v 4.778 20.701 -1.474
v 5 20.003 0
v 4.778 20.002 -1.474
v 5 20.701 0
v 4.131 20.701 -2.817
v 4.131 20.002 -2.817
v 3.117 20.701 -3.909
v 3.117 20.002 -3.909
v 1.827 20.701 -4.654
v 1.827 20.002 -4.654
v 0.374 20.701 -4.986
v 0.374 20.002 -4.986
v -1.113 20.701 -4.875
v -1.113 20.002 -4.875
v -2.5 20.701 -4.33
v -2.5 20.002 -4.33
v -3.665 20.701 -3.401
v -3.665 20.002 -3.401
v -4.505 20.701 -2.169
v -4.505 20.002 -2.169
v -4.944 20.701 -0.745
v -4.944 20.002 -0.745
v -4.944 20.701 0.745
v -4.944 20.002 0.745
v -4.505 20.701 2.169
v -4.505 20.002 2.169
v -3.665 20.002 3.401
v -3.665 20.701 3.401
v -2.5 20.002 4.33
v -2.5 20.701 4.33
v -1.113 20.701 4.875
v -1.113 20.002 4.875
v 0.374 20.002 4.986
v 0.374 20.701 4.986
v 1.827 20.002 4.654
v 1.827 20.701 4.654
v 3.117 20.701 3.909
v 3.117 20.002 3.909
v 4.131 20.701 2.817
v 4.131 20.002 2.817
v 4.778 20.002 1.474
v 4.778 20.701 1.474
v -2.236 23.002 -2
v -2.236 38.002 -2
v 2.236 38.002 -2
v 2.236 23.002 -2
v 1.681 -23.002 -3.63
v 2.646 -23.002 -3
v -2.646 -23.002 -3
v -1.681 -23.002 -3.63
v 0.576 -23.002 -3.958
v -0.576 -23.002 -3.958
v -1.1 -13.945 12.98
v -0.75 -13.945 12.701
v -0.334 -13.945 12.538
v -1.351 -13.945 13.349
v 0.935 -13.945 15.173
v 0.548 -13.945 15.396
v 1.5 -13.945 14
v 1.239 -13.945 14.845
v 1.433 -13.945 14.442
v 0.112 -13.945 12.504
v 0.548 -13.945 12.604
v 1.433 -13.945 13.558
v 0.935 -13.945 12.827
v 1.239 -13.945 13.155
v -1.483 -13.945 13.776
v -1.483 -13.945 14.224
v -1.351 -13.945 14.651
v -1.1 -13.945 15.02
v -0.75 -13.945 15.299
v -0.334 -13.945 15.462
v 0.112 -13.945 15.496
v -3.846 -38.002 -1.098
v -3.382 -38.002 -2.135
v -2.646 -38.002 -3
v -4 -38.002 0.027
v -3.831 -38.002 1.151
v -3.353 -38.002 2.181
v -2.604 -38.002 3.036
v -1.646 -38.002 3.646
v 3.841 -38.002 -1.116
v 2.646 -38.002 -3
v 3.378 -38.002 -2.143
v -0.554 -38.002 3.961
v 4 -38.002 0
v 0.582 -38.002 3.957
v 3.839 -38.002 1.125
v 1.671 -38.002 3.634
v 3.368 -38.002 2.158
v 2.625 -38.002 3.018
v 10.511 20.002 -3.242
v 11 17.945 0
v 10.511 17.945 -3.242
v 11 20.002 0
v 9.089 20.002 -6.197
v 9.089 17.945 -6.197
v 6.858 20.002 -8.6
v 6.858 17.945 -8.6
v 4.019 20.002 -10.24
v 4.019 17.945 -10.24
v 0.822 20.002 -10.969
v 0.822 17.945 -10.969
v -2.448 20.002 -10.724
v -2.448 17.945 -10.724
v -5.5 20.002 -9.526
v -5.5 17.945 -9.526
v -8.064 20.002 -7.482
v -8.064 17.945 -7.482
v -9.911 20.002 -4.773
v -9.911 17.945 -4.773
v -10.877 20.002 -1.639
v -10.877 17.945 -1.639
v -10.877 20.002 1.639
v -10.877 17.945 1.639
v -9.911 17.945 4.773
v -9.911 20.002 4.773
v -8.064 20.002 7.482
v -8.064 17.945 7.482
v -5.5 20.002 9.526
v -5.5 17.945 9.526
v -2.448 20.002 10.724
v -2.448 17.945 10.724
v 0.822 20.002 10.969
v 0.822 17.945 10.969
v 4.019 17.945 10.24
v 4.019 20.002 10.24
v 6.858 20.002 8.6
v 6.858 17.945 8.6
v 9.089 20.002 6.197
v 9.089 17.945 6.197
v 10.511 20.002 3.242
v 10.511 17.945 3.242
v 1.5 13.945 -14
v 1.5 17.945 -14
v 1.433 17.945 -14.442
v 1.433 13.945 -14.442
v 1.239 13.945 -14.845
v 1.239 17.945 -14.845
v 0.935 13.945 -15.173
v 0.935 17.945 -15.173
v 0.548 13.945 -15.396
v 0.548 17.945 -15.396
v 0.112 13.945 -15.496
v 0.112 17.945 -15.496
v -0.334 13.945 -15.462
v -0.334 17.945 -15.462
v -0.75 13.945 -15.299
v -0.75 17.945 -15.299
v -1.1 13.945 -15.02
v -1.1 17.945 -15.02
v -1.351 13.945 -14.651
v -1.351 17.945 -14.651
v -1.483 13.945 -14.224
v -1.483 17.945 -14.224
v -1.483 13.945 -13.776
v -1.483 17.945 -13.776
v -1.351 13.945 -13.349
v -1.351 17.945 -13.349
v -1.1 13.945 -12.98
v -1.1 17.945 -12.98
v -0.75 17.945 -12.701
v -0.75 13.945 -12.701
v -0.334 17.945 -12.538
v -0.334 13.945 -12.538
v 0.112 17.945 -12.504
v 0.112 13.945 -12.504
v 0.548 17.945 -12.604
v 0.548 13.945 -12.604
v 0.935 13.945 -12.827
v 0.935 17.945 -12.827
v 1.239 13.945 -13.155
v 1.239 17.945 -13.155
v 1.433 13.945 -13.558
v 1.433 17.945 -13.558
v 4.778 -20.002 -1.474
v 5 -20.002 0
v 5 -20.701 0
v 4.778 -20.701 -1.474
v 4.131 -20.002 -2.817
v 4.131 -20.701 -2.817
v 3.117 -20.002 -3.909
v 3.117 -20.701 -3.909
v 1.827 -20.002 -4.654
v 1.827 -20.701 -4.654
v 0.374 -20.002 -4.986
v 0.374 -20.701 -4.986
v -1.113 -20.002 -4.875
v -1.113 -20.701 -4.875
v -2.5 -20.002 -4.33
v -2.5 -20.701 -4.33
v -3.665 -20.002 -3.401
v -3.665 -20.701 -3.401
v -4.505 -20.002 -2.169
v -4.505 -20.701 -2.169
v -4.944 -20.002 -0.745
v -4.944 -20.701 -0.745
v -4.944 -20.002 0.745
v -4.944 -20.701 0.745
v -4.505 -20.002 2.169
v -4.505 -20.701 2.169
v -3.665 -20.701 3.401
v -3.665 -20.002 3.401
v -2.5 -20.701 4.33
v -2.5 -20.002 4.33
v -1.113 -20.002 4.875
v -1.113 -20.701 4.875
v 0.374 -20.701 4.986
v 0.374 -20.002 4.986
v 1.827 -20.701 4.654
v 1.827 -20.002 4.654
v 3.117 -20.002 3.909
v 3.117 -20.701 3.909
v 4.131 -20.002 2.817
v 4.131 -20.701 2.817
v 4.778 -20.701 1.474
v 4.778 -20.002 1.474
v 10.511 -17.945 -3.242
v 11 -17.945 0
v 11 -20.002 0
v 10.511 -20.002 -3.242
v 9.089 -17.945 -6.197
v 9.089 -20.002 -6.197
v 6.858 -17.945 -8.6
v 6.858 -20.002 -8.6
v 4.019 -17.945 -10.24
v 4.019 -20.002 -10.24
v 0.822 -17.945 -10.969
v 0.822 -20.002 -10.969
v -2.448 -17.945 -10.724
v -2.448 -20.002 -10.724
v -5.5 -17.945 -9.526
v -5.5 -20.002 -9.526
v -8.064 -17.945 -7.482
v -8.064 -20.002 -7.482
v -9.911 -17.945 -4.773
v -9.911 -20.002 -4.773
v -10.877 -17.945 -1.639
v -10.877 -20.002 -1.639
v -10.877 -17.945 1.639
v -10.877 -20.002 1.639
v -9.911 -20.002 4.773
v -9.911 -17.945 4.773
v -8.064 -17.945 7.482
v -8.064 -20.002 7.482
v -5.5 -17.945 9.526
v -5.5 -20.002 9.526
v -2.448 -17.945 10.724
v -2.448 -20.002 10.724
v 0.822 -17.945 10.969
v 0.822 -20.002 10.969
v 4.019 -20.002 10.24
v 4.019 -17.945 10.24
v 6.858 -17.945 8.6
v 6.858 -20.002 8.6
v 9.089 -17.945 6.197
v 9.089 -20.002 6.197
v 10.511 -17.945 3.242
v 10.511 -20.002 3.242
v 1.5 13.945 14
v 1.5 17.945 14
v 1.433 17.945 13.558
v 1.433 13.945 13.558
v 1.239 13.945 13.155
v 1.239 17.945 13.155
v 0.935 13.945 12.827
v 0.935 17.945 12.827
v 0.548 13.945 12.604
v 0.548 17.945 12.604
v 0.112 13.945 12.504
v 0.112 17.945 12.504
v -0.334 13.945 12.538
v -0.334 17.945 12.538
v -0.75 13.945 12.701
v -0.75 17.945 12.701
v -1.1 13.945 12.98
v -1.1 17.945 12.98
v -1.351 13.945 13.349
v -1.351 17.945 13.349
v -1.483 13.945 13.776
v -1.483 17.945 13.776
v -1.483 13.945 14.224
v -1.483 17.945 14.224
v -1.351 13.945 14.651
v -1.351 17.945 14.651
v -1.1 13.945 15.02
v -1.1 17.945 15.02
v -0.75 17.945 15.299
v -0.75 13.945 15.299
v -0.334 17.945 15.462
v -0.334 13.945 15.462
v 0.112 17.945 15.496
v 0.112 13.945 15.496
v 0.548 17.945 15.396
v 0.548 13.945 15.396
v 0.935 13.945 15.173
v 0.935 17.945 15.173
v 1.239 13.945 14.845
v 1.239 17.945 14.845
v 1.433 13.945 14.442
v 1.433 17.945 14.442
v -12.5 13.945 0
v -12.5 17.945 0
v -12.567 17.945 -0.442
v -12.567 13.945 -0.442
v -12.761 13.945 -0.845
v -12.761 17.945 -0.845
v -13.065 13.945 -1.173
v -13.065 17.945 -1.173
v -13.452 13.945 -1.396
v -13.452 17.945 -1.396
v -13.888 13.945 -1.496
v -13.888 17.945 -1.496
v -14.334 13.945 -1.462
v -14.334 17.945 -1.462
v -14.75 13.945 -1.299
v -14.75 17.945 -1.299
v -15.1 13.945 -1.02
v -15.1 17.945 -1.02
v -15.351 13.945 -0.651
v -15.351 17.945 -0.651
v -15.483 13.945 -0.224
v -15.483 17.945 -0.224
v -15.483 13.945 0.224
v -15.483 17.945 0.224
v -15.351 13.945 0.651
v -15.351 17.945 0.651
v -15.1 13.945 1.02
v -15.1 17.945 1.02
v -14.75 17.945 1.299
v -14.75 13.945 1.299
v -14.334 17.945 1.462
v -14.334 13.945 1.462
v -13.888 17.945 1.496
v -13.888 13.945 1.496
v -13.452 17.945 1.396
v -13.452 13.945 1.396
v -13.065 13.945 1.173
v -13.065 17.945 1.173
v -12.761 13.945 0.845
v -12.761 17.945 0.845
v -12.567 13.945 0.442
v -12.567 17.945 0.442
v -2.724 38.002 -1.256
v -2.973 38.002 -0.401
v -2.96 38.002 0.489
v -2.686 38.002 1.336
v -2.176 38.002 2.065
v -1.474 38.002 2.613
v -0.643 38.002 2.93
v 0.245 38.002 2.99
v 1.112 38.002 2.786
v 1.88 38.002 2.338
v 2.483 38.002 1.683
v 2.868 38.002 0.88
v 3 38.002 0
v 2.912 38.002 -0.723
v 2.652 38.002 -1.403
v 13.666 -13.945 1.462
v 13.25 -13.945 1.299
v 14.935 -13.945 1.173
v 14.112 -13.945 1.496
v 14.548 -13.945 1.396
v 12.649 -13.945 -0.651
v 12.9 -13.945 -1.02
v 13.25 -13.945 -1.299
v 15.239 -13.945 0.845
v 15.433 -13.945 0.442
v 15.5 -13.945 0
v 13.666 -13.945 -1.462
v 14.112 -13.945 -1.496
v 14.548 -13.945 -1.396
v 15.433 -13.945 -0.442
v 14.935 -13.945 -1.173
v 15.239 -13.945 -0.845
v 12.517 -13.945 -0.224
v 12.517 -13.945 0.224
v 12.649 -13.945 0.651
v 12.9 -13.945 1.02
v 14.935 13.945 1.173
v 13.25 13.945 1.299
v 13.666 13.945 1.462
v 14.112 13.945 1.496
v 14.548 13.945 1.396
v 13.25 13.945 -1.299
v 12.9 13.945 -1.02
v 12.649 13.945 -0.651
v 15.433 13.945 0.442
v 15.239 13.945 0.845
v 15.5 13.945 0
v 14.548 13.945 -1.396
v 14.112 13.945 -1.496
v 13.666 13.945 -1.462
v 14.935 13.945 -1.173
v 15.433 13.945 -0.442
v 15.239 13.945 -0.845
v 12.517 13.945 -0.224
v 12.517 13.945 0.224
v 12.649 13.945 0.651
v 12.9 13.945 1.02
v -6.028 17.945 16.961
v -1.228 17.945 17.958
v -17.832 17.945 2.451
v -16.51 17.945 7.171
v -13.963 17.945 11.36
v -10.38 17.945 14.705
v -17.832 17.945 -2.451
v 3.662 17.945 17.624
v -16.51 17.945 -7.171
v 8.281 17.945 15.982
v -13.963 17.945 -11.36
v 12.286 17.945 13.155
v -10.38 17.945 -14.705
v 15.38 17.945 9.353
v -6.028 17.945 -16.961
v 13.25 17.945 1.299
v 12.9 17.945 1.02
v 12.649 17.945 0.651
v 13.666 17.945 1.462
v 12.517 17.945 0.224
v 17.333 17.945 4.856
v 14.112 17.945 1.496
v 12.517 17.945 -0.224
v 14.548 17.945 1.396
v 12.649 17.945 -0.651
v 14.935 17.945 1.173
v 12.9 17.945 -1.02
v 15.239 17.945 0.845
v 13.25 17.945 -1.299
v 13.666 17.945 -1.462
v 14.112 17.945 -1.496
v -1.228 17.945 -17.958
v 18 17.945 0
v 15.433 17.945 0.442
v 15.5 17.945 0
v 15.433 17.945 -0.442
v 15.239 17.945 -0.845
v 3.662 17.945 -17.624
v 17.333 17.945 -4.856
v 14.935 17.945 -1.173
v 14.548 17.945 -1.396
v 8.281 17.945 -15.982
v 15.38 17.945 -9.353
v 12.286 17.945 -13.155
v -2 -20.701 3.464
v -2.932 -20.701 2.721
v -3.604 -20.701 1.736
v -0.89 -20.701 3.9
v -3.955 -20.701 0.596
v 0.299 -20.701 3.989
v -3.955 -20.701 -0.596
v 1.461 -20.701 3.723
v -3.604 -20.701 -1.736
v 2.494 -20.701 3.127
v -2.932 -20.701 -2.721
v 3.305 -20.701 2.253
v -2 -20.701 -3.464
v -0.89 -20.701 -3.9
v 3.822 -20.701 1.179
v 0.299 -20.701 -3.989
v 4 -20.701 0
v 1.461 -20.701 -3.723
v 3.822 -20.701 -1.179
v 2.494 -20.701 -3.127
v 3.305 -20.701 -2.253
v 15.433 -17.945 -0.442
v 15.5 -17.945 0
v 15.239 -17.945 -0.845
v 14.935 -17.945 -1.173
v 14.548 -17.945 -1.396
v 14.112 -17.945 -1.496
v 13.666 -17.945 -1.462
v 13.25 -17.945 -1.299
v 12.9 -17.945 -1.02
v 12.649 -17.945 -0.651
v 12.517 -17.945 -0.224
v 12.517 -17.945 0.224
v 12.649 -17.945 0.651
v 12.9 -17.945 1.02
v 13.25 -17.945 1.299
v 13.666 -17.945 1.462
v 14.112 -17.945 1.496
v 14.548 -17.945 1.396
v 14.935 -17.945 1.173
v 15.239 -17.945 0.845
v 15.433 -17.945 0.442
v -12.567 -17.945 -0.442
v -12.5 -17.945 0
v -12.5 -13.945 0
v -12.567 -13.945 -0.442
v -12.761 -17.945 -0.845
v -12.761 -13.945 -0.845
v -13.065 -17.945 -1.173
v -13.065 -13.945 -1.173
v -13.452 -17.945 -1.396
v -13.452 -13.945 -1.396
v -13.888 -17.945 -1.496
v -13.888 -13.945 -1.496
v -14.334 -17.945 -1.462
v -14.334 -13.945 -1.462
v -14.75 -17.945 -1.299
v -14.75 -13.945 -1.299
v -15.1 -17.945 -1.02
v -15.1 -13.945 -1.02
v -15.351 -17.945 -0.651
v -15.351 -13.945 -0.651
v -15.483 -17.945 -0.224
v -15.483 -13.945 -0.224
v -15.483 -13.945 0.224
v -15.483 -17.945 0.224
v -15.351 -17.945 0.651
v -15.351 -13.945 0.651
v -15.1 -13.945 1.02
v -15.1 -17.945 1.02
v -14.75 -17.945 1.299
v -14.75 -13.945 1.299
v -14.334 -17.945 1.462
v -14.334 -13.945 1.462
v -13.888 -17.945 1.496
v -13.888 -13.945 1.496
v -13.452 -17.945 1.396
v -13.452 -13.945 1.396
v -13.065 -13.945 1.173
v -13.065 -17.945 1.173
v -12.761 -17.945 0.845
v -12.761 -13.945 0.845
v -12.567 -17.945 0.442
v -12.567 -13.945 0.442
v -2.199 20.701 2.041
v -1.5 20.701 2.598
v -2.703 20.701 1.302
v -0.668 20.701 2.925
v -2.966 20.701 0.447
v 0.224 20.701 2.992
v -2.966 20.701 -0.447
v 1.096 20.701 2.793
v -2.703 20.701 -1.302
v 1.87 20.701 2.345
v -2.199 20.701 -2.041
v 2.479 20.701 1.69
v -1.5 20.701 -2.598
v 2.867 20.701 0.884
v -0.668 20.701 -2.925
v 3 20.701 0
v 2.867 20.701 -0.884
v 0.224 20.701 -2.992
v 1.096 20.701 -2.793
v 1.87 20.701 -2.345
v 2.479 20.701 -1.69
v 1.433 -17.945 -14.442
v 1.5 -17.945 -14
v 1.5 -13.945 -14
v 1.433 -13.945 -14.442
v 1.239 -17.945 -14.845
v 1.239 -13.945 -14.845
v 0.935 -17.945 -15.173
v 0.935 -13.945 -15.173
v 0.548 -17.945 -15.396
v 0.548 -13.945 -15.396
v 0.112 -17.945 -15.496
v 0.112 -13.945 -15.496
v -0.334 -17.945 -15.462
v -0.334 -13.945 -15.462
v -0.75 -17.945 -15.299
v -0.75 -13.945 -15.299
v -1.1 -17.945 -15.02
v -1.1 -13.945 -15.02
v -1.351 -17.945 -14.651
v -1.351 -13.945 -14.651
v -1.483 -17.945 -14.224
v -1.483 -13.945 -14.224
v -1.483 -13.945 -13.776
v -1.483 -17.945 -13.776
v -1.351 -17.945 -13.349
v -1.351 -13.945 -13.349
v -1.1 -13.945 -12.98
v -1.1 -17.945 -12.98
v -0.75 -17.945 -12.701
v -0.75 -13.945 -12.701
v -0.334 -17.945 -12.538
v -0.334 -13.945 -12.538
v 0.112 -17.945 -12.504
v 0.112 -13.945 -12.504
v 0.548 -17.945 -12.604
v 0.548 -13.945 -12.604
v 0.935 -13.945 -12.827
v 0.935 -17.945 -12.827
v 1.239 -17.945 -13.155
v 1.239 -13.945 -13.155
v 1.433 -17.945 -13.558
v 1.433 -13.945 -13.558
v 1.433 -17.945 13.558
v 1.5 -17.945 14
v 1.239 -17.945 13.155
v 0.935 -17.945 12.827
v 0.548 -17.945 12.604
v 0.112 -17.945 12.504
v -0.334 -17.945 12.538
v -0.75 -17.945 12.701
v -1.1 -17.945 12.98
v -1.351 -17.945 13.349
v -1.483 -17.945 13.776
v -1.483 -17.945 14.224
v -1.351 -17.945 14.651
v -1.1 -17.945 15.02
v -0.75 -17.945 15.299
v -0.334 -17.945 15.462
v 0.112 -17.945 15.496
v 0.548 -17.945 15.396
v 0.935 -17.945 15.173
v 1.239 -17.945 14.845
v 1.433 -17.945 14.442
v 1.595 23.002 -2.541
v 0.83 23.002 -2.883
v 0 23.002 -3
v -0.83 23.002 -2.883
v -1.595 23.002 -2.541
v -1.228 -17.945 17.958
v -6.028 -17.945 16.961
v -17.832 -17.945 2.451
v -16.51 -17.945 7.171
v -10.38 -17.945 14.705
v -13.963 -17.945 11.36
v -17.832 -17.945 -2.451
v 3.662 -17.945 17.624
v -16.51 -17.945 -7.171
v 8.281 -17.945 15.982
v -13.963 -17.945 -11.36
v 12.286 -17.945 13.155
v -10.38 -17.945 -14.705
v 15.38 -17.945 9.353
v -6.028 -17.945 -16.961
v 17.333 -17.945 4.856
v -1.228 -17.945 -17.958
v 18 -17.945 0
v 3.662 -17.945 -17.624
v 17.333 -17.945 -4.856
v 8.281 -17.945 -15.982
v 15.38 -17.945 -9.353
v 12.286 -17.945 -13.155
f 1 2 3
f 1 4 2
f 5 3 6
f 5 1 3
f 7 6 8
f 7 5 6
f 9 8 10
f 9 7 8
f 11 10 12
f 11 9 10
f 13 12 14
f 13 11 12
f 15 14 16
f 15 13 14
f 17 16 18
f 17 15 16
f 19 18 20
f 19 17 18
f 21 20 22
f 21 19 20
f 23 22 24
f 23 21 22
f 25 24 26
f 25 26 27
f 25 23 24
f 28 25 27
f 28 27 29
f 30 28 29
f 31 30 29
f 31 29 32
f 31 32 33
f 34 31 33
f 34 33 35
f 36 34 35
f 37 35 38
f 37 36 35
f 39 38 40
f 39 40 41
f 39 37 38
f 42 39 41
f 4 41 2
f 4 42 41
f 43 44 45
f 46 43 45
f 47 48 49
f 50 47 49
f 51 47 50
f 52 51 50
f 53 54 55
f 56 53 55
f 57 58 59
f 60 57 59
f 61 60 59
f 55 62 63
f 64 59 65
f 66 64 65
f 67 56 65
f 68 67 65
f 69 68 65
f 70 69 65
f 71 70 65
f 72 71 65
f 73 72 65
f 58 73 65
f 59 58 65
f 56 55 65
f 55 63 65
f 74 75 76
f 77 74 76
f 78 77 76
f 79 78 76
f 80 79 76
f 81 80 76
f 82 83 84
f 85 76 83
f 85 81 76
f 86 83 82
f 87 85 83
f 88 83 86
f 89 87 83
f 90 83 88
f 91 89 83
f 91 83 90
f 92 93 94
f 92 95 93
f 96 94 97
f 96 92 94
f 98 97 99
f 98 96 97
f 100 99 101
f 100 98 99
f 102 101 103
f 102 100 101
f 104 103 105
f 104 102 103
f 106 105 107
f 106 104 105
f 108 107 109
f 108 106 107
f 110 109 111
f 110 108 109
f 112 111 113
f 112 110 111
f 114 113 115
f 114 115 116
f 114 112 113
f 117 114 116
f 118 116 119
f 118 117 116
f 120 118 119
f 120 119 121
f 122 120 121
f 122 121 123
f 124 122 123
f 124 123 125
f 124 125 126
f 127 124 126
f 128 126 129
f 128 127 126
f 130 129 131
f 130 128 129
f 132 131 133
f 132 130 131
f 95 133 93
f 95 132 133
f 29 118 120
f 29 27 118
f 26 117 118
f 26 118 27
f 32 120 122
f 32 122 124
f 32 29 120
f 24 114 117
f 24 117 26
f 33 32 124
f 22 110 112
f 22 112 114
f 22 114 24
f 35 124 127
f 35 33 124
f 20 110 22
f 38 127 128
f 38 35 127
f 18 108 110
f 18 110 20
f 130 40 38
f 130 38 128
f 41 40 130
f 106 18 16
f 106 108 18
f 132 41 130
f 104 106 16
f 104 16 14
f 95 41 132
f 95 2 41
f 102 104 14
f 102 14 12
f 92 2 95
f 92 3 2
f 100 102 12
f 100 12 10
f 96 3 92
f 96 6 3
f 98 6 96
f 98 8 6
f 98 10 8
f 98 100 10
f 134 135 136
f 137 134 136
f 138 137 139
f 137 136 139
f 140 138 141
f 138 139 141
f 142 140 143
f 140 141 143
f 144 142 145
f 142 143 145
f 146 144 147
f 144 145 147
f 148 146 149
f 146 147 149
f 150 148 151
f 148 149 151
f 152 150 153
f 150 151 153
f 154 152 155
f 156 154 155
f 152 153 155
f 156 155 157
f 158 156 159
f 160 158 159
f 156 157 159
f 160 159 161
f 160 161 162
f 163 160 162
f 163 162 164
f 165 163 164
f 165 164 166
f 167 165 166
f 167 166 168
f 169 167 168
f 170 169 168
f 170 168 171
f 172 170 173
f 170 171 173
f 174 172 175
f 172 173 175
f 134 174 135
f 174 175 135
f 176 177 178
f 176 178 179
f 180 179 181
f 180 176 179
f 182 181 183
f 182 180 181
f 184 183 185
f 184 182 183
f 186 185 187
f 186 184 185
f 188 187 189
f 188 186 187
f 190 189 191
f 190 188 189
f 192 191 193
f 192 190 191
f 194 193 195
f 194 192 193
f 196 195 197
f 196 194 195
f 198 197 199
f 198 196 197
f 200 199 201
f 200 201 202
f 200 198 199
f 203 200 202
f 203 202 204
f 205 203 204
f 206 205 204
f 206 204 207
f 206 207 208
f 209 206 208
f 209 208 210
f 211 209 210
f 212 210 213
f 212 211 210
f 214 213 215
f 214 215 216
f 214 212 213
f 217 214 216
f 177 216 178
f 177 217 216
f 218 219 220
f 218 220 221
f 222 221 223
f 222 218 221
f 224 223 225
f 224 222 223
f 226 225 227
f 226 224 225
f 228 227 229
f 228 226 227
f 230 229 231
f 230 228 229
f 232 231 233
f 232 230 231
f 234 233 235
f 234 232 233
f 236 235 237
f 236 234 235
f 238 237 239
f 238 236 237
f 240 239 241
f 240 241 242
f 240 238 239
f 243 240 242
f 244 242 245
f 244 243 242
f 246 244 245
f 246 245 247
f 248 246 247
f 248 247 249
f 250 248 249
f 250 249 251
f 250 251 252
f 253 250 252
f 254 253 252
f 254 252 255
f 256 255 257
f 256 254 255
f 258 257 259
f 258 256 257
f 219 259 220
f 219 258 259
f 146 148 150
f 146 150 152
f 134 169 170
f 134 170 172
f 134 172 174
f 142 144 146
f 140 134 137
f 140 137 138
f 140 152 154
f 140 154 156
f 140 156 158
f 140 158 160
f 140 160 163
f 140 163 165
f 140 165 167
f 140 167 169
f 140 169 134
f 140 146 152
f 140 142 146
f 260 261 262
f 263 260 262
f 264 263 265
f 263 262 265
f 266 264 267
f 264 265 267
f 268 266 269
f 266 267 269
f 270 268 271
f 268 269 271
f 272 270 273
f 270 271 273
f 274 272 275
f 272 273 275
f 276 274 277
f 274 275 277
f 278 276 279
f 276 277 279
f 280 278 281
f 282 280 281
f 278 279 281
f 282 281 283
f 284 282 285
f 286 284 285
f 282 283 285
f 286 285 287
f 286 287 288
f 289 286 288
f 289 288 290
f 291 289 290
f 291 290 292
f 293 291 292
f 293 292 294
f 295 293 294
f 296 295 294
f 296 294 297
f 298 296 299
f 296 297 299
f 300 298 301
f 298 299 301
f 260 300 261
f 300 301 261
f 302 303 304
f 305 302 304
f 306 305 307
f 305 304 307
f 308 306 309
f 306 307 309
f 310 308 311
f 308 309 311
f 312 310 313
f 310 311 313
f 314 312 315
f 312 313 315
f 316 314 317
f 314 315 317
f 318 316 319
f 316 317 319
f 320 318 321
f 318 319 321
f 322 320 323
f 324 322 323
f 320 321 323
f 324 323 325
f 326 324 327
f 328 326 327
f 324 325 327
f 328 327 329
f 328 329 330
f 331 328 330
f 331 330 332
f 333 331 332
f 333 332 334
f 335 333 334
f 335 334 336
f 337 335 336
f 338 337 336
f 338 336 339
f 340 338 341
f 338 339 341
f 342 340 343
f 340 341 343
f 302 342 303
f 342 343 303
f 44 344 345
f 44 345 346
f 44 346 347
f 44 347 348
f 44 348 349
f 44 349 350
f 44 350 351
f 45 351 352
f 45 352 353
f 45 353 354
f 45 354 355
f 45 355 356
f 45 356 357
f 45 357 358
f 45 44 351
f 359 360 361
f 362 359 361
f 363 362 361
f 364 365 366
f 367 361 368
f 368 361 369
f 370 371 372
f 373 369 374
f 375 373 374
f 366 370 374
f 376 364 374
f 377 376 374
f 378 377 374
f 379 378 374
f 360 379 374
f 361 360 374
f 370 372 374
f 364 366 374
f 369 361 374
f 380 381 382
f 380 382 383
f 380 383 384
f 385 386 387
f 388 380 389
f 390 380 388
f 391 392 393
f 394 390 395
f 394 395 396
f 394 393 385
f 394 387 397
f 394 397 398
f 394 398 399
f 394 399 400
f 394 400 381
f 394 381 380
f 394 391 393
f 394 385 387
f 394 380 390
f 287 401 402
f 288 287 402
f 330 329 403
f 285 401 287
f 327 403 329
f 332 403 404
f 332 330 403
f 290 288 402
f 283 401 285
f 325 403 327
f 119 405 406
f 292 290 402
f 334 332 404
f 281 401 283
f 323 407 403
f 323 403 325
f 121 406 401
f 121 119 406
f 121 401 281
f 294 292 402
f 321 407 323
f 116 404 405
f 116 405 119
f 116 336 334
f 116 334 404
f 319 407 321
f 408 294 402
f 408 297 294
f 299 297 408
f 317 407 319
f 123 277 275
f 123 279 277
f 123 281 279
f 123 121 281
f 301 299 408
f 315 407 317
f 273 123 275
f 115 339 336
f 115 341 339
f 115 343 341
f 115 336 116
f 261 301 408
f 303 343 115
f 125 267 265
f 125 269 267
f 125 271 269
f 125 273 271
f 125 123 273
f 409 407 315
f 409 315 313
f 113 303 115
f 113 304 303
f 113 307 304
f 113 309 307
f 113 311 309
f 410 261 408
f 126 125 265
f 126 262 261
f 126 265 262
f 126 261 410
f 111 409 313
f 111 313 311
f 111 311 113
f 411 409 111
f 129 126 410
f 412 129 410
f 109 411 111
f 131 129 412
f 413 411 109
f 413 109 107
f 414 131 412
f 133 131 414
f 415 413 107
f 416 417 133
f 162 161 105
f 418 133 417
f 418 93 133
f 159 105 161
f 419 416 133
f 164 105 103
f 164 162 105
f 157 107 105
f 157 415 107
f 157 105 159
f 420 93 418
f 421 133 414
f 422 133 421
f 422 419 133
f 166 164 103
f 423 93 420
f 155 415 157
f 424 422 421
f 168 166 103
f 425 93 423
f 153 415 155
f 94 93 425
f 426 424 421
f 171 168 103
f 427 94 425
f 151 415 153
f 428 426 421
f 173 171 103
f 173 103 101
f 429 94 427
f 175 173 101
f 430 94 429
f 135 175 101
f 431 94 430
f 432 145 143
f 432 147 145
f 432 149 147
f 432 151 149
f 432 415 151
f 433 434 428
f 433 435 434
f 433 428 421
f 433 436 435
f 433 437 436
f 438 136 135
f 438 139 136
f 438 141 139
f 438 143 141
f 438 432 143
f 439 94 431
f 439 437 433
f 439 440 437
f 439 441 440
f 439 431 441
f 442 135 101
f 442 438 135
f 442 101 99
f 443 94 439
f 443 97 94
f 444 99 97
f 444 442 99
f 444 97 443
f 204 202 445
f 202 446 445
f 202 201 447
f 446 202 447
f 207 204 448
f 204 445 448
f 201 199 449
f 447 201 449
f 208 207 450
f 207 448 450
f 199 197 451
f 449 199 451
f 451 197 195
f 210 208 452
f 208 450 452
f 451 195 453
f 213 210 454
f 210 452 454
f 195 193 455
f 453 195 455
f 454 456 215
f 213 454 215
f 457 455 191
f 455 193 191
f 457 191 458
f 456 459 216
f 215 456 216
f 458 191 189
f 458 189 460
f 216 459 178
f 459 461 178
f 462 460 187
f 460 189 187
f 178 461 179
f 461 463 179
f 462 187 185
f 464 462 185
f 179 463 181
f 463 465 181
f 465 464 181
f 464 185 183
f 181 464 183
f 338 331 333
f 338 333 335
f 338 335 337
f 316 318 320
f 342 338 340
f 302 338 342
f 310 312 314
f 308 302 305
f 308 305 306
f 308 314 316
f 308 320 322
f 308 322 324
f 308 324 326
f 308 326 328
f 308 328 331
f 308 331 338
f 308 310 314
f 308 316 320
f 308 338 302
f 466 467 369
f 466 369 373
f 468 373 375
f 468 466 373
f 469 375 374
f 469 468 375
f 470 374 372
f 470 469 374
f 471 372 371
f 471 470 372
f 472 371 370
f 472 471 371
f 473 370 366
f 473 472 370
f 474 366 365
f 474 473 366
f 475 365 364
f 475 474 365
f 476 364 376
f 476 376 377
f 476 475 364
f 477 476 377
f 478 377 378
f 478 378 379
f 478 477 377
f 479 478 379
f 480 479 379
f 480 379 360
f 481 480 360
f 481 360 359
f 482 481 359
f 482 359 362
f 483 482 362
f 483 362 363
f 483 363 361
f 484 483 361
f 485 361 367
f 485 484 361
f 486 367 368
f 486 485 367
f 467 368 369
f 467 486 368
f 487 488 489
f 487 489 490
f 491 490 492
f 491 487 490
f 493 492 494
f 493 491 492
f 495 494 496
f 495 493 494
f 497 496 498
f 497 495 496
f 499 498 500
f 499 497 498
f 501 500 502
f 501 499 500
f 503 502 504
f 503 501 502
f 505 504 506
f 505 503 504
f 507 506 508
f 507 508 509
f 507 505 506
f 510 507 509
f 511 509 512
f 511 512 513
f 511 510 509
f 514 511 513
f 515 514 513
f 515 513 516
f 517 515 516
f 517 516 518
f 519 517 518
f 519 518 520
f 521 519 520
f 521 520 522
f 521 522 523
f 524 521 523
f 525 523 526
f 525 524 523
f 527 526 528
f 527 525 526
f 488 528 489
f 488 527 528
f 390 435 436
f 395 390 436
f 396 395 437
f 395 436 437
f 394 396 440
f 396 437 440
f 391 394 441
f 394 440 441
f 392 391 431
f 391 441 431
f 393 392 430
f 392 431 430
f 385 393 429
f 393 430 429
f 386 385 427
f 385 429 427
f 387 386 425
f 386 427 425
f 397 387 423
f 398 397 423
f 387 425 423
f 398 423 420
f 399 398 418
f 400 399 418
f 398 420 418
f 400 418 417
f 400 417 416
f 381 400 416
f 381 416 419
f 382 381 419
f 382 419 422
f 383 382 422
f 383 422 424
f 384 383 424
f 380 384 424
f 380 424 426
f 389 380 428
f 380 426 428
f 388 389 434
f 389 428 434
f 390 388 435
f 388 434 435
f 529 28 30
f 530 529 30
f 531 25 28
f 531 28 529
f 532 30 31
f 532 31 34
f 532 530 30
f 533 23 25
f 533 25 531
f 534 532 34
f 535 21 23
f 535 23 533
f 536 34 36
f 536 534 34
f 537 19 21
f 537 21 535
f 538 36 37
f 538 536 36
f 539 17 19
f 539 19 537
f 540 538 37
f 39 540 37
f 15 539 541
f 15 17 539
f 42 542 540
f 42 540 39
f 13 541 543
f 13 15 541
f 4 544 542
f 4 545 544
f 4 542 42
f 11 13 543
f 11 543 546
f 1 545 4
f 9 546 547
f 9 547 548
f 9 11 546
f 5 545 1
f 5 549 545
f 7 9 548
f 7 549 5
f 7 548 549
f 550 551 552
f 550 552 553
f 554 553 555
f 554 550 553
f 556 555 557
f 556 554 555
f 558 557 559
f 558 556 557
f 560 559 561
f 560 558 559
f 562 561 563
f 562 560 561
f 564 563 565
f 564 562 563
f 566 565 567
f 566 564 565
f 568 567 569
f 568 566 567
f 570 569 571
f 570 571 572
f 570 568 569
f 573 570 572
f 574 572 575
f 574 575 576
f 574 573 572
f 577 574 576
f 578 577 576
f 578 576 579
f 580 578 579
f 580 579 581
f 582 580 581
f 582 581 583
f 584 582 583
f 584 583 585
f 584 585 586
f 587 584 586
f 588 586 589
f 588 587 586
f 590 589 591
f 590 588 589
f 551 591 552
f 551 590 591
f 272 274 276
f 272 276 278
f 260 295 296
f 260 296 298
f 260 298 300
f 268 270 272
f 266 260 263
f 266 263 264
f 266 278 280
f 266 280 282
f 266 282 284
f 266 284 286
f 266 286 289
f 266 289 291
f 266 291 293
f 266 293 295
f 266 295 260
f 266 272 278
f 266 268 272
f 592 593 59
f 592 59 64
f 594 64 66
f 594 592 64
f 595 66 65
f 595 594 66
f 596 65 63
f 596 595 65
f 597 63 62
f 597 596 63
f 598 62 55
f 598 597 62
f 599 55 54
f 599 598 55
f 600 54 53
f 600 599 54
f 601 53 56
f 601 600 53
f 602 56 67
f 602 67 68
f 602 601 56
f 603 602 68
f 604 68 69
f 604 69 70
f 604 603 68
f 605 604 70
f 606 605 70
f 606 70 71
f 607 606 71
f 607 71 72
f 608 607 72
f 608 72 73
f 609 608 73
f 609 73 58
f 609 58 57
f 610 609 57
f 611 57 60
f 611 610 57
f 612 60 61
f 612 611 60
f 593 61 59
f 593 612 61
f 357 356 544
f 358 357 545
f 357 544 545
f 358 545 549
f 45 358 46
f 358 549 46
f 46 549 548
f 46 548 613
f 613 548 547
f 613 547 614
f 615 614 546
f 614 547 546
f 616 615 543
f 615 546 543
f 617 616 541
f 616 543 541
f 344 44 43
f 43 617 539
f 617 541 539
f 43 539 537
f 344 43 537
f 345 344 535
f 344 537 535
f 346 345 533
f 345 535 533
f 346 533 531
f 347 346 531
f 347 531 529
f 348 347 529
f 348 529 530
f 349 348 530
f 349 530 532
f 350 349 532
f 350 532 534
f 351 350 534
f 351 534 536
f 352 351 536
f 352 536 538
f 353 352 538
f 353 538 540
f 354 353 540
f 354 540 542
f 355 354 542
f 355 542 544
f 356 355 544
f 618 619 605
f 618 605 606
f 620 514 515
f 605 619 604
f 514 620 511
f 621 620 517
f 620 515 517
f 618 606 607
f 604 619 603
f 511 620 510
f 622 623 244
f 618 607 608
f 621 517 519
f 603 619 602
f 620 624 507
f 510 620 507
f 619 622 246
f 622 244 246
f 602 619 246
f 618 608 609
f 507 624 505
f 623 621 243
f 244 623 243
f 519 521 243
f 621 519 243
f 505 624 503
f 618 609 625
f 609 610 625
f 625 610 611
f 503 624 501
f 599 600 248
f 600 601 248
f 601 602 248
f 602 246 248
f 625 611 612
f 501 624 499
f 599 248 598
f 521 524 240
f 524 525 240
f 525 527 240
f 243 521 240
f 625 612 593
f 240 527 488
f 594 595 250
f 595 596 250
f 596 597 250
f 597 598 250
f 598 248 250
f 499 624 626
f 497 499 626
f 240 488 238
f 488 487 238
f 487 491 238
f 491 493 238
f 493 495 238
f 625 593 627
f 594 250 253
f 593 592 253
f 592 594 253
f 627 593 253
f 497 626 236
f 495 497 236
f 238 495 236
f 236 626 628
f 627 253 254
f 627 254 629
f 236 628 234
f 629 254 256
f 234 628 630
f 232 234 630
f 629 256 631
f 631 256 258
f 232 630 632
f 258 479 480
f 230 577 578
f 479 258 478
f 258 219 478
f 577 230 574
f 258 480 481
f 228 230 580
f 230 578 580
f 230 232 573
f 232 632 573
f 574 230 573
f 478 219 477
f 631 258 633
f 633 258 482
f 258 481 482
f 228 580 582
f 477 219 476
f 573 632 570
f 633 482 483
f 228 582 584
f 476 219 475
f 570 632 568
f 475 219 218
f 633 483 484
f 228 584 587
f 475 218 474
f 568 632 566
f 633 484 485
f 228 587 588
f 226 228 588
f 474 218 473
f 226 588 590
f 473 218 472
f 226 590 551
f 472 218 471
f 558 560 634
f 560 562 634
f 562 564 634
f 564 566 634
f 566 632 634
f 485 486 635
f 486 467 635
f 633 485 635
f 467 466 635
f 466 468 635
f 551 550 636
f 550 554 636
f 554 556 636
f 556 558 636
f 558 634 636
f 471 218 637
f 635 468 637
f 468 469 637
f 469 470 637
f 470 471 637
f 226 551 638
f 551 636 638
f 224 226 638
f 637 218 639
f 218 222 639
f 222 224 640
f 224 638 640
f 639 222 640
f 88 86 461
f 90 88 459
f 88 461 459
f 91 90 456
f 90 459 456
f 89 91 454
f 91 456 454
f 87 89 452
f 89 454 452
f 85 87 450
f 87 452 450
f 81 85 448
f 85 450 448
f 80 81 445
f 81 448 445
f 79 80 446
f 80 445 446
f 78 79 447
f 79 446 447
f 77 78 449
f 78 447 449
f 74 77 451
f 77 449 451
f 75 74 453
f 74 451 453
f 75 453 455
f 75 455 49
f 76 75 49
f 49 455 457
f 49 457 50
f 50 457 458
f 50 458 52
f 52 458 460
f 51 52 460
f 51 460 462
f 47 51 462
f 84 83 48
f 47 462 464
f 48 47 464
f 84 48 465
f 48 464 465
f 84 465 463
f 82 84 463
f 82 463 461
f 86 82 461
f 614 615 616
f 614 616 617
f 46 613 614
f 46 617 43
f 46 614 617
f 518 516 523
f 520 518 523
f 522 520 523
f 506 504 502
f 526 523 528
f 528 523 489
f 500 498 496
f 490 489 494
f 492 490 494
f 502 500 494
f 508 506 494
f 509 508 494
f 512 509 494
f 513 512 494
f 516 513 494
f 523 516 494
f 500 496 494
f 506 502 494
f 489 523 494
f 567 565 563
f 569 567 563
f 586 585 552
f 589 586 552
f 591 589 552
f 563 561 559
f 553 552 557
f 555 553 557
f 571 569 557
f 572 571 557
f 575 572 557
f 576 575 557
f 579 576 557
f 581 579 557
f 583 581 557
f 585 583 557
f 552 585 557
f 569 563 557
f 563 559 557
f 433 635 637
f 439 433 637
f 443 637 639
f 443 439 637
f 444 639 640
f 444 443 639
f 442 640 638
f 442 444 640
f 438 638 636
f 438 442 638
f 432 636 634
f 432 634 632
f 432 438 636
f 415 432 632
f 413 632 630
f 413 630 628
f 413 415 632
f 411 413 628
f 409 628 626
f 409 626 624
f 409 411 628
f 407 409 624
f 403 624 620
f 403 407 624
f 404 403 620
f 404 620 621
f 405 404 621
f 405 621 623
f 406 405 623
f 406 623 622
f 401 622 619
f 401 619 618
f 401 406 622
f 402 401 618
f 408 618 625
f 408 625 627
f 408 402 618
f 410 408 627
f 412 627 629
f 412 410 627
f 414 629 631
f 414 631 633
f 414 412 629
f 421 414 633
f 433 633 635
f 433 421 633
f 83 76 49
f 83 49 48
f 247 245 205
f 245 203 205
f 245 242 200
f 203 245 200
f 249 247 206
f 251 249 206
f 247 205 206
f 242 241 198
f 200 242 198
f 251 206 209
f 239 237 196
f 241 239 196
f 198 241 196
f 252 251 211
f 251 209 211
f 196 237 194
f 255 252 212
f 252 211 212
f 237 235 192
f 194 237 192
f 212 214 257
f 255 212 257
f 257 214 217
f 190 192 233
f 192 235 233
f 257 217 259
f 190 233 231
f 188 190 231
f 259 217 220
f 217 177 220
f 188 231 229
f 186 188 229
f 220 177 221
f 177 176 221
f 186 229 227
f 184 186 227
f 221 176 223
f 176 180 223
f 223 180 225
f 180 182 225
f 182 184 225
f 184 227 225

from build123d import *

# Parameters (mm, degrees)
SKETCH1_R           = 18
BOSS_EXTRUDE1_DEPTH = 17.9451
BOSS_EXTRUDE2_START = -17.9451
SKETCH2_R           = 11
BOSS_EXTRUDE2_DEPTH = 20.0025
SKETCH3_R           = 3
BOSS_EXTRUDE4_DEPTH = 18
CUT_EXTRUDE1_DEPTH  = 15
SKETCH5_R           = 1.5
CUT_EXTRUDE2_DEPTH  = 4
SKETCH6_R           = 4
BOSS_EXTRUDE5_DEPTH = 18
CUT_EXTRUDE3_DEPTH  = 15
SKETCH9_R           = 5
BOSS_EXTRUDE6_DEPTH = 20.701


with BuildPart() as part:
    # Sketch1 → Boss-Extrude1 (new body, symmetric)
    with BuildSketch(Plane(origin=(0, 0, 0), x_dir=(1, 0, 0), z_dir=(0, 1, 0))):
        Circle(SKETCH1_R)
    extrude(amount=BOSS_EXTRUDE1_DEPTH, both=True)

    # Sketch2 → Boss-Extrude2 (add, symmetric)
    with BuildSketch(Plane(origin=(0, 17.9451, 0), x_dir=(1, 0, 0), z_dir=(0, 1, 0)).offset(BOSS_EXTRUDE2_START)):
        Circle(SKETCH2_R)
    extrude(amount=BOSS_EXTRUDE2_DEPTH, both=True)

    # Sketch3 → Boss-Extrude4 (add)
    with BuildSketch(Plane(origin=(0, 20.0025, 0), x_dir=(1, 0, 0), z_dir=(0, 1, 0))):
        Circle(SKETCH3_R)
    extrude(amount=BOSS_EXTRUDE4_DEPTH)

    # Sketch4 → Cut-Extrude1 (cut)
    with BuildSketch(Plane(origin=(0, 38.0025, 0), x_dir=(1, 0, 0), z_dir=(0, 1, 0))):
        with BuildLine():
            Line((-2.236067977, 2), (2.236067977, 2))
            ThreePointArc((2.236067977, 2), (0, 3), (-2.236067977, 2))
        make_face()
    cut_extrude1 = extrude(amount=-CUT_EXTRUDE1_DEPTH, mode=Mode.SUBTRACT)

    # Sketch5 → Cut-Extrude2 (cut)
    with BuildSketch(Plane(origin=(0, 17.9451, 0), x_dir=(1, 0, 0), z_dir=(0, 1, 0))):
        with Locations((0, 14)):
            Circle(SKETCH5_R)
        with Locations((-14, 0)):
            Circle(SKETCH5_R)
        with Locations((0, -14)):
            Circle(SKETCH5_R)
        with Locations((14, 0)):
            Circle(SKETCH5_R)
    cut_extrude2 = extrude(amount=-CUT_EXTRUDE2_DEPTH, mode=Mode.SUBTRACT)

    # Mirror1: Cut-Extrude1, Cut-Extrude2 across plane
    add(cut_extrude1.mirror(Plane.ZX), mode=Mode.SUBTRACT)
    add(cut_extrude2.mirror(Plane.ZX), mode=Mode.SUBTRACT)

    # Sketch6 → Boss-Extrude5 (add)
    with BuildSketch(Plane.XZ.offset(20.0025)):
        Circle(SKETCH6_R)
    extrude(amount=BOSS_EXTRUDE5_DEPTH)

    # Sketch7 → Cut-Extrude3 (cut)
    with BuildSketch(Plane.XZ.offset(38.0025)):
        with BuildLine():
            Line((-2.645751311, -3), (2.645751311, -3))
            ThreePointArc((2.645751311, -3), (0, -4), (-2.645751311, -3))
        make_face()
    extrude(amount=-CUT_EXTRUDE3_DEPTH, mode=Mode.SUBTRACT)

    # Sketch9 → Boss-Extrude6 (add, symmetric)
    with BuildSketch(Plane(origin=(0, 0, 0), x_dir=(1, 0, 0), z_dir=(0, 1, 0))):
        Circle(SKETCH9_R)
    extrude(amount=BOSS_EXTRUDE6_DEPTH, both=True)


solid = part.part
